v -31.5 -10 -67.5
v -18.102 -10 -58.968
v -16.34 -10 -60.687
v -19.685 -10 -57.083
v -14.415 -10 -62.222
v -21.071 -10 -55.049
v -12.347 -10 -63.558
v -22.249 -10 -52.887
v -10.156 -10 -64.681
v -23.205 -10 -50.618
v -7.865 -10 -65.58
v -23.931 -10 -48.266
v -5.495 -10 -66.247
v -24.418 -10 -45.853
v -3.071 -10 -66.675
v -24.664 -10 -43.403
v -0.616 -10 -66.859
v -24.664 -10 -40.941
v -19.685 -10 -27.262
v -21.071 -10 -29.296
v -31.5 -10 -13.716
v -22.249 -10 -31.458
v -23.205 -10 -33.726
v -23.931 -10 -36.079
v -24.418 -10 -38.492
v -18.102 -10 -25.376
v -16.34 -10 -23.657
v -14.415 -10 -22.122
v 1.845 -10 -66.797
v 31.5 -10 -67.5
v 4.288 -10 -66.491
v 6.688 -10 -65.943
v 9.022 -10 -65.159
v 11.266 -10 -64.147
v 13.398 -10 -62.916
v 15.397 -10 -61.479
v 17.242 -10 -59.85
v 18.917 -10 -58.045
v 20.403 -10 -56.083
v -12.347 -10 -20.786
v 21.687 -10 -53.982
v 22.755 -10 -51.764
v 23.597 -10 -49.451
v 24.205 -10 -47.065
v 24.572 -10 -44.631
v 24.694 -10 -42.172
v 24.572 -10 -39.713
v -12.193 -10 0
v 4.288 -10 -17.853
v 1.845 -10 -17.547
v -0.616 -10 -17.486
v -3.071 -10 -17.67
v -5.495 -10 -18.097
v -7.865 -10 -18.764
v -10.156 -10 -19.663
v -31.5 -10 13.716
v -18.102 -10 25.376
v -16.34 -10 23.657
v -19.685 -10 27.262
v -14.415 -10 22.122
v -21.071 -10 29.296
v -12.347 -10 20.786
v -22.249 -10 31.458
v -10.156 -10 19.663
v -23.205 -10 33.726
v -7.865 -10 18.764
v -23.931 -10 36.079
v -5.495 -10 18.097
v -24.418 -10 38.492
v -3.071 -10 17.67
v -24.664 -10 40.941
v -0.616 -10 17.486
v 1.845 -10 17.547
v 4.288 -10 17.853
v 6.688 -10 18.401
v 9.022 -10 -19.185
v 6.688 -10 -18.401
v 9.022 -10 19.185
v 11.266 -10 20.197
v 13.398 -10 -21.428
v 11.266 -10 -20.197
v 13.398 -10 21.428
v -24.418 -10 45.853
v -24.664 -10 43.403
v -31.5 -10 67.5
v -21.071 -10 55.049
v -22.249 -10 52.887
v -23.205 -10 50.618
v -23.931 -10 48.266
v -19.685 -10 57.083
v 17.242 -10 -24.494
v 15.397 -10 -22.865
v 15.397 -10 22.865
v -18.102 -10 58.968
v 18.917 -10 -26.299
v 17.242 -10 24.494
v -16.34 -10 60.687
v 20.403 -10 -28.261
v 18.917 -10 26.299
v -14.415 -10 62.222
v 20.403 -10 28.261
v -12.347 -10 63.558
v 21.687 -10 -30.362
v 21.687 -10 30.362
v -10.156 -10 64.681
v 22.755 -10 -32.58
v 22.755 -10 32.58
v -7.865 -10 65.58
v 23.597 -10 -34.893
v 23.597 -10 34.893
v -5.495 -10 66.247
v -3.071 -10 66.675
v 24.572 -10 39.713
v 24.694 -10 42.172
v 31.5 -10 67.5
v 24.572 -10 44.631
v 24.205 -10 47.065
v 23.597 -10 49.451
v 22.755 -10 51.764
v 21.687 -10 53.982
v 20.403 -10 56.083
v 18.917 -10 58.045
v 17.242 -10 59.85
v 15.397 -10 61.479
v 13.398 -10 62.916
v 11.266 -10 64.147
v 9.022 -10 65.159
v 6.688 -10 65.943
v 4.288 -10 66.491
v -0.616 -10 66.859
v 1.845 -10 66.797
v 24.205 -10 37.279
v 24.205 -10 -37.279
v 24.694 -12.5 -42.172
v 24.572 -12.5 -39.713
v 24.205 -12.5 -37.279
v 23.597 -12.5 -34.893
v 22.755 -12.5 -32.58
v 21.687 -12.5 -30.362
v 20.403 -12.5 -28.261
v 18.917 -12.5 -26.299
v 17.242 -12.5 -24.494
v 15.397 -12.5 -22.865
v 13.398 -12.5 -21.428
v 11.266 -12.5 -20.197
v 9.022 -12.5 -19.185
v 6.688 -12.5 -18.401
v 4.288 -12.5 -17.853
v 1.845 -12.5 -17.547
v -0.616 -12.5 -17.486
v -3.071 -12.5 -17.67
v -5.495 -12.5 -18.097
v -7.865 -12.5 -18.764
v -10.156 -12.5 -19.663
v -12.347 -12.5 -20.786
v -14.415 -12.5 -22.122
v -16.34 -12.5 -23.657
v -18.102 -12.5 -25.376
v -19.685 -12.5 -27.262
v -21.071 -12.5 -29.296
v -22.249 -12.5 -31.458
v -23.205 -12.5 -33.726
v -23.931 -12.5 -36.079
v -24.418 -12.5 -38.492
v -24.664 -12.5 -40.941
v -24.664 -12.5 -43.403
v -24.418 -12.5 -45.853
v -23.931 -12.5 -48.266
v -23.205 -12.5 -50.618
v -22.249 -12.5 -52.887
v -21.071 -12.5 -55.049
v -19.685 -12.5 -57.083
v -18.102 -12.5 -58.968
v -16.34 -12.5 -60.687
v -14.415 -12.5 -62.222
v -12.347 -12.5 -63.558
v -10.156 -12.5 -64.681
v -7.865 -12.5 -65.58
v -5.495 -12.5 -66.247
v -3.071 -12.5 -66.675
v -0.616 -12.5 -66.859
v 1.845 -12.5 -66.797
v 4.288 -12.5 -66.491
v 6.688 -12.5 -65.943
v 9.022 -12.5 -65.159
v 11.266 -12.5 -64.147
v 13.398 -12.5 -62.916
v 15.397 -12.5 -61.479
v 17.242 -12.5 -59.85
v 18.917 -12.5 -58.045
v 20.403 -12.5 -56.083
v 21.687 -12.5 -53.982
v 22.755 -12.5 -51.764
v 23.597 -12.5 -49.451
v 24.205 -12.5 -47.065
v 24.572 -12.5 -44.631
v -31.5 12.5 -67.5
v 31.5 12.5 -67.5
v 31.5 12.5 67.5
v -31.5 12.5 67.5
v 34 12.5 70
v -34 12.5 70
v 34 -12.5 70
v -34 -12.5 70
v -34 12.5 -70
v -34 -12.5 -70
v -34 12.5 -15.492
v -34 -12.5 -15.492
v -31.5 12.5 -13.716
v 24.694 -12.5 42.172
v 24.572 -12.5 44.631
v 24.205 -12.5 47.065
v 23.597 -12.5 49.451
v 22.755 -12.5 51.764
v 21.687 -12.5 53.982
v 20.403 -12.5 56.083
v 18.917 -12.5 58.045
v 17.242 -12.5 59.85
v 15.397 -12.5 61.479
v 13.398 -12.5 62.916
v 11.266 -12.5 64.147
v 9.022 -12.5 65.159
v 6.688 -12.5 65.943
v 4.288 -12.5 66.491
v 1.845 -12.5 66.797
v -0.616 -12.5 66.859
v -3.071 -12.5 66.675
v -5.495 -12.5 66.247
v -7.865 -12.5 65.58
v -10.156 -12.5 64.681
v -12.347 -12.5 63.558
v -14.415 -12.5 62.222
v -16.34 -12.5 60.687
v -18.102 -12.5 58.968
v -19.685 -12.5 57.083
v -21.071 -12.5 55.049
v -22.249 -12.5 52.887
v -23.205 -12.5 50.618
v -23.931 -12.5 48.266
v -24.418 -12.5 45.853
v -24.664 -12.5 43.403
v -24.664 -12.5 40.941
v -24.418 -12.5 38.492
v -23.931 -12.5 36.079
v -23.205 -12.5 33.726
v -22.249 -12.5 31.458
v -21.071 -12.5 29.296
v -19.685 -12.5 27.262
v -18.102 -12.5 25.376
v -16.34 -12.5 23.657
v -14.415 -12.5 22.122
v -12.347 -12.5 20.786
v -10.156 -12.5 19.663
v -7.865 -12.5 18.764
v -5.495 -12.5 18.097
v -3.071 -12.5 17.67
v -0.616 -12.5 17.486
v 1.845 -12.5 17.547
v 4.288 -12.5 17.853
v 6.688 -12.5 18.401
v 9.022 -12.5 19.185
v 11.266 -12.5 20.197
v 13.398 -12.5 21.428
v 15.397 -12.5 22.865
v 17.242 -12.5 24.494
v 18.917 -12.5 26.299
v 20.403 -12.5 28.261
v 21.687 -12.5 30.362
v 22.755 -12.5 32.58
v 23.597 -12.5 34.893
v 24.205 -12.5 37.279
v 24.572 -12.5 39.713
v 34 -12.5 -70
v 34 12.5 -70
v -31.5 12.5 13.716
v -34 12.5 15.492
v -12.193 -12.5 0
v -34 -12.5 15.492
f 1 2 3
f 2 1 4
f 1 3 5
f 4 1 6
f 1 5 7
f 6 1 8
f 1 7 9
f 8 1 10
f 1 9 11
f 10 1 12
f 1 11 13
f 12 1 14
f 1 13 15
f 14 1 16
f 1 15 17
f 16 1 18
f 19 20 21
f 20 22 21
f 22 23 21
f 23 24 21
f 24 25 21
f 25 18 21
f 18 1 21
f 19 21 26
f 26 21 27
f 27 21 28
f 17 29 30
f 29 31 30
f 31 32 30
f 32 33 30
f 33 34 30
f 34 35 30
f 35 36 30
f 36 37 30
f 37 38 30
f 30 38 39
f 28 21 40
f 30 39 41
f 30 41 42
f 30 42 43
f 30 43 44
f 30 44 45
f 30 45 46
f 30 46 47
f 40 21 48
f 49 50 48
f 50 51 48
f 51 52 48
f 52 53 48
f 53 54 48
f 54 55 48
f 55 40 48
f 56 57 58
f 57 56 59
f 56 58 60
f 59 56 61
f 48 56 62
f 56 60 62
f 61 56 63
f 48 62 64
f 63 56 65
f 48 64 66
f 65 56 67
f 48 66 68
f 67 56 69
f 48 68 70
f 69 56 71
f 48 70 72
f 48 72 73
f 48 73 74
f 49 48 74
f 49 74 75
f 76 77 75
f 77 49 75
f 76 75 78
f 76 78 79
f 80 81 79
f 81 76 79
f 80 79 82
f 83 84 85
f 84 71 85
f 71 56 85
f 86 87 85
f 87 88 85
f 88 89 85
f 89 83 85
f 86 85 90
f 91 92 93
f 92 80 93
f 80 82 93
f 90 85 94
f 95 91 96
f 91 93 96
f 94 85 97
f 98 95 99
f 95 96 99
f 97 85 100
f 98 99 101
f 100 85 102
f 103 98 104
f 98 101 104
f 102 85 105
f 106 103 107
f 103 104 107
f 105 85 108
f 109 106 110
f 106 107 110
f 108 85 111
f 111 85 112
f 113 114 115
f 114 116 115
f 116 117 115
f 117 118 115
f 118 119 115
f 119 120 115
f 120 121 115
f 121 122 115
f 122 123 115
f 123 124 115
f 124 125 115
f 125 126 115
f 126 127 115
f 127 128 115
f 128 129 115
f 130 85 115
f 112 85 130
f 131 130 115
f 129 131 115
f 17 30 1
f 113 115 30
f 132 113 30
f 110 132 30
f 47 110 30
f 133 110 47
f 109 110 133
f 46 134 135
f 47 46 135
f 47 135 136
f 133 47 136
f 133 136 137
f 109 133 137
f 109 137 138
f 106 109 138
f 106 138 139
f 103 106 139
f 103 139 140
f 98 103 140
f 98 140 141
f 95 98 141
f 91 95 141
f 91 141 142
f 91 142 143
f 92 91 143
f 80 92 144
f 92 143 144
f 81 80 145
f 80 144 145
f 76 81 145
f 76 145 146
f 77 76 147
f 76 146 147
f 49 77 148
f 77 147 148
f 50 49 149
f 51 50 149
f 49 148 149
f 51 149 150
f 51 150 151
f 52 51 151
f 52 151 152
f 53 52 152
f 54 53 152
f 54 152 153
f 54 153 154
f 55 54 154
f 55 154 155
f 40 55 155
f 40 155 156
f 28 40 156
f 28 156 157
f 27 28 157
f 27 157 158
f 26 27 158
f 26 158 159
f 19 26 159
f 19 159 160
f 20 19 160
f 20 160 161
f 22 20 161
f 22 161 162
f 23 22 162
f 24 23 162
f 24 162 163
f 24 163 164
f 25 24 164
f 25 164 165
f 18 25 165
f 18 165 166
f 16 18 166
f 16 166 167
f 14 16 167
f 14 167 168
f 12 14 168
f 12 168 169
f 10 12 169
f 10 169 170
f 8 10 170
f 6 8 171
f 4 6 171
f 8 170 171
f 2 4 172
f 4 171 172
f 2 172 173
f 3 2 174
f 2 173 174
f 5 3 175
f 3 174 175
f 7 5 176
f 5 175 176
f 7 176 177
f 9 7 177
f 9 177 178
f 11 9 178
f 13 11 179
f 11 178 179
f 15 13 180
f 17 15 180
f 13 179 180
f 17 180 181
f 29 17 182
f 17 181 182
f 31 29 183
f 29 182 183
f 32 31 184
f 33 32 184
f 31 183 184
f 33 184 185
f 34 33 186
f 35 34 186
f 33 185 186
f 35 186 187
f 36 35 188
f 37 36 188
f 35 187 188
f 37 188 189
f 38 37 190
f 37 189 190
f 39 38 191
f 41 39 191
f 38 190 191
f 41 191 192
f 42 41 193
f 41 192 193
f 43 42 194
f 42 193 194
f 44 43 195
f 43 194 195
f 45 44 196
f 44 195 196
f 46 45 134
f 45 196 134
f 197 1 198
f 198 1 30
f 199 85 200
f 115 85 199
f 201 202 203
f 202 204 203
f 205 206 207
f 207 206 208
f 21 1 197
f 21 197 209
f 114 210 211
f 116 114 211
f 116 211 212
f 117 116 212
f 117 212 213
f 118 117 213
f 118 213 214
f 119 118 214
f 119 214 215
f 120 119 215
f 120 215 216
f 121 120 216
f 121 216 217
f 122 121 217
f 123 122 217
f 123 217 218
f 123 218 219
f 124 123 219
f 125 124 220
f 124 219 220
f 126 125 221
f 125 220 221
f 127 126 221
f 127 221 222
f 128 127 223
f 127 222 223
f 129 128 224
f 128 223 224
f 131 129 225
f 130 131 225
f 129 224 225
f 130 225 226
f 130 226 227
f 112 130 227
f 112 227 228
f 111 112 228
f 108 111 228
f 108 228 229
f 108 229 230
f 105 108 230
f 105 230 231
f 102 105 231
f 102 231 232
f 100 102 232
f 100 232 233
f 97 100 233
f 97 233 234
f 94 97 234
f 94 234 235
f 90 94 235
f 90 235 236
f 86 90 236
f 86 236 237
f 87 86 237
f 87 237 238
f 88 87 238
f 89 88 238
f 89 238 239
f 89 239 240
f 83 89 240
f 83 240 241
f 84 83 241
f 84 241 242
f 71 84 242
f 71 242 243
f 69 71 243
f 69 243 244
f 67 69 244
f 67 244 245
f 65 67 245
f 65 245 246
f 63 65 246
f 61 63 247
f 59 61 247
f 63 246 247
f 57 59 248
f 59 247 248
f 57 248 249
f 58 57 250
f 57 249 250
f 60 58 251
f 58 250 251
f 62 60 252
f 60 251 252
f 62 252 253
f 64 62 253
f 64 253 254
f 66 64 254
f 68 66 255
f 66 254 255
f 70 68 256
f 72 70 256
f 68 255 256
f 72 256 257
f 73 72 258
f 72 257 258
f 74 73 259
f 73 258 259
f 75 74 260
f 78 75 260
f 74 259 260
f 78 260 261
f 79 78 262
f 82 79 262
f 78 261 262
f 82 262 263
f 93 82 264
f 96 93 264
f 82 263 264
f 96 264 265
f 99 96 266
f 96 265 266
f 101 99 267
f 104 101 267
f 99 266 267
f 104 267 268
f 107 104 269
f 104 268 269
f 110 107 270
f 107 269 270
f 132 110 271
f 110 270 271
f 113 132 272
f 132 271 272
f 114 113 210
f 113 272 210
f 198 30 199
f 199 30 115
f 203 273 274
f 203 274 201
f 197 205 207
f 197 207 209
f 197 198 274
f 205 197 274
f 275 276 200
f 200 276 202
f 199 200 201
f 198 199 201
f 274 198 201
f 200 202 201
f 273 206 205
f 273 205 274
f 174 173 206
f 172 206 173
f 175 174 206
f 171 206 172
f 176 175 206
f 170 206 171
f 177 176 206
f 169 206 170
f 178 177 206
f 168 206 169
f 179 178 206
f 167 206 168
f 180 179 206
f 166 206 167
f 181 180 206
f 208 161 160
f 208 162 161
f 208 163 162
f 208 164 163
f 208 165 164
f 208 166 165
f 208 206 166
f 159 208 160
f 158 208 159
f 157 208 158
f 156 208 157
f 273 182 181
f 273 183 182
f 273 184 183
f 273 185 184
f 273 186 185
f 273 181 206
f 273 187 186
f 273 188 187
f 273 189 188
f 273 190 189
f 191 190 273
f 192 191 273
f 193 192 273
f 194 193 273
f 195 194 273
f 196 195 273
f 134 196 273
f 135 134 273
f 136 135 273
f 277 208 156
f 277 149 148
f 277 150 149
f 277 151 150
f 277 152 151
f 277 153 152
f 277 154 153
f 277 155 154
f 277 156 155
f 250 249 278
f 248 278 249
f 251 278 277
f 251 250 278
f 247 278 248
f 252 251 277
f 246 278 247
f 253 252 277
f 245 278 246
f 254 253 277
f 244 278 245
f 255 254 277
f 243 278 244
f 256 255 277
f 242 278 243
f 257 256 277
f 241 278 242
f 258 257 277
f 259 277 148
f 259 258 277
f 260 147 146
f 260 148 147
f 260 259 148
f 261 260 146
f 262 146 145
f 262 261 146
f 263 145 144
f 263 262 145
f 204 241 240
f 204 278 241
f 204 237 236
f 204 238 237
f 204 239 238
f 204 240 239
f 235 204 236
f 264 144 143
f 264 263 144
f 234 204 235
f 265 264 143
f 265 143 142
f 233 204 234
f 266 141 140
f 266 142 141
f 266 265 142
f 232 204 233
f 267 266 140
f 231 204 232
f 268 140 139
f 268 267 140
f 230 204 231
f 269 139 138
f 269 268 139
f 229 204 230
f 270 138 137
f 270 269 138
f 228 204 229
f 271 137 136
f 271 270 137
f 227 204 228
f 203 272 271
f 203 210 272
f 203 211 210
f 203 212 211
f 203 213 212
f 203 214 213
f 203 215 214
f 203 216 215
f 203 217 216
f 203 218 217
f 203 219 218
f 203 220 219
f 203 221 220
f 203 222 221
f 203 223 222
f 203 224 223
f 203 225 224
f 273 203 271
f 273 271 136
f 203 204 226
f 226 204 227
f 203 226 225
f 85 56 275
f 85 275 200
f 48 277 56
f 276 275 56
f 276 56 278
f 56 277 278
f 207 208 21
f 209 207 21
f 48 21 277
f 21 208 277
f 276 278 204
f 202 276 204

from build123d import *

# Parameters (mm, degrees)
F0_W     = 68
F0_H     = 140
F1_DEPTH = 12.5
F2_T     = -2.5
F3_R     = 24.694221
F4_DEPTH = 150


with BuildPart() as f1:
    # F0 (on Front) → F1 (new body, symmetric)
    with BuildSketch(Plane.XZ):
        Rectangle(F0_W, F0_H)
    extrude(amount=F1_DEPTH, both=True)

    # F2
    f2_openings = [f1.faces().sort_by_distance(p)[0] for p in [
        (0, 12.5, 0),
    ]]
    offset(amount=F2_T, openings=f2_openings)

    # F3 (on face) → F4 (cut, symmetric)
    with BuildSketch(Plane.XZ.offset(12.5)):
        with Locations((0, 42.172134)):
            Circle(F3_R)
        with Locations((0, -42.172134)):
            Circle(F3_R)
        Polygon((-12.192623, 0), (-34, 15.491804), (-34, -15.491804), align=None)
    extrude(amount=F4_DEPTH, both=True, mode=Mode.SUBTRACT)


solid = f1.part
